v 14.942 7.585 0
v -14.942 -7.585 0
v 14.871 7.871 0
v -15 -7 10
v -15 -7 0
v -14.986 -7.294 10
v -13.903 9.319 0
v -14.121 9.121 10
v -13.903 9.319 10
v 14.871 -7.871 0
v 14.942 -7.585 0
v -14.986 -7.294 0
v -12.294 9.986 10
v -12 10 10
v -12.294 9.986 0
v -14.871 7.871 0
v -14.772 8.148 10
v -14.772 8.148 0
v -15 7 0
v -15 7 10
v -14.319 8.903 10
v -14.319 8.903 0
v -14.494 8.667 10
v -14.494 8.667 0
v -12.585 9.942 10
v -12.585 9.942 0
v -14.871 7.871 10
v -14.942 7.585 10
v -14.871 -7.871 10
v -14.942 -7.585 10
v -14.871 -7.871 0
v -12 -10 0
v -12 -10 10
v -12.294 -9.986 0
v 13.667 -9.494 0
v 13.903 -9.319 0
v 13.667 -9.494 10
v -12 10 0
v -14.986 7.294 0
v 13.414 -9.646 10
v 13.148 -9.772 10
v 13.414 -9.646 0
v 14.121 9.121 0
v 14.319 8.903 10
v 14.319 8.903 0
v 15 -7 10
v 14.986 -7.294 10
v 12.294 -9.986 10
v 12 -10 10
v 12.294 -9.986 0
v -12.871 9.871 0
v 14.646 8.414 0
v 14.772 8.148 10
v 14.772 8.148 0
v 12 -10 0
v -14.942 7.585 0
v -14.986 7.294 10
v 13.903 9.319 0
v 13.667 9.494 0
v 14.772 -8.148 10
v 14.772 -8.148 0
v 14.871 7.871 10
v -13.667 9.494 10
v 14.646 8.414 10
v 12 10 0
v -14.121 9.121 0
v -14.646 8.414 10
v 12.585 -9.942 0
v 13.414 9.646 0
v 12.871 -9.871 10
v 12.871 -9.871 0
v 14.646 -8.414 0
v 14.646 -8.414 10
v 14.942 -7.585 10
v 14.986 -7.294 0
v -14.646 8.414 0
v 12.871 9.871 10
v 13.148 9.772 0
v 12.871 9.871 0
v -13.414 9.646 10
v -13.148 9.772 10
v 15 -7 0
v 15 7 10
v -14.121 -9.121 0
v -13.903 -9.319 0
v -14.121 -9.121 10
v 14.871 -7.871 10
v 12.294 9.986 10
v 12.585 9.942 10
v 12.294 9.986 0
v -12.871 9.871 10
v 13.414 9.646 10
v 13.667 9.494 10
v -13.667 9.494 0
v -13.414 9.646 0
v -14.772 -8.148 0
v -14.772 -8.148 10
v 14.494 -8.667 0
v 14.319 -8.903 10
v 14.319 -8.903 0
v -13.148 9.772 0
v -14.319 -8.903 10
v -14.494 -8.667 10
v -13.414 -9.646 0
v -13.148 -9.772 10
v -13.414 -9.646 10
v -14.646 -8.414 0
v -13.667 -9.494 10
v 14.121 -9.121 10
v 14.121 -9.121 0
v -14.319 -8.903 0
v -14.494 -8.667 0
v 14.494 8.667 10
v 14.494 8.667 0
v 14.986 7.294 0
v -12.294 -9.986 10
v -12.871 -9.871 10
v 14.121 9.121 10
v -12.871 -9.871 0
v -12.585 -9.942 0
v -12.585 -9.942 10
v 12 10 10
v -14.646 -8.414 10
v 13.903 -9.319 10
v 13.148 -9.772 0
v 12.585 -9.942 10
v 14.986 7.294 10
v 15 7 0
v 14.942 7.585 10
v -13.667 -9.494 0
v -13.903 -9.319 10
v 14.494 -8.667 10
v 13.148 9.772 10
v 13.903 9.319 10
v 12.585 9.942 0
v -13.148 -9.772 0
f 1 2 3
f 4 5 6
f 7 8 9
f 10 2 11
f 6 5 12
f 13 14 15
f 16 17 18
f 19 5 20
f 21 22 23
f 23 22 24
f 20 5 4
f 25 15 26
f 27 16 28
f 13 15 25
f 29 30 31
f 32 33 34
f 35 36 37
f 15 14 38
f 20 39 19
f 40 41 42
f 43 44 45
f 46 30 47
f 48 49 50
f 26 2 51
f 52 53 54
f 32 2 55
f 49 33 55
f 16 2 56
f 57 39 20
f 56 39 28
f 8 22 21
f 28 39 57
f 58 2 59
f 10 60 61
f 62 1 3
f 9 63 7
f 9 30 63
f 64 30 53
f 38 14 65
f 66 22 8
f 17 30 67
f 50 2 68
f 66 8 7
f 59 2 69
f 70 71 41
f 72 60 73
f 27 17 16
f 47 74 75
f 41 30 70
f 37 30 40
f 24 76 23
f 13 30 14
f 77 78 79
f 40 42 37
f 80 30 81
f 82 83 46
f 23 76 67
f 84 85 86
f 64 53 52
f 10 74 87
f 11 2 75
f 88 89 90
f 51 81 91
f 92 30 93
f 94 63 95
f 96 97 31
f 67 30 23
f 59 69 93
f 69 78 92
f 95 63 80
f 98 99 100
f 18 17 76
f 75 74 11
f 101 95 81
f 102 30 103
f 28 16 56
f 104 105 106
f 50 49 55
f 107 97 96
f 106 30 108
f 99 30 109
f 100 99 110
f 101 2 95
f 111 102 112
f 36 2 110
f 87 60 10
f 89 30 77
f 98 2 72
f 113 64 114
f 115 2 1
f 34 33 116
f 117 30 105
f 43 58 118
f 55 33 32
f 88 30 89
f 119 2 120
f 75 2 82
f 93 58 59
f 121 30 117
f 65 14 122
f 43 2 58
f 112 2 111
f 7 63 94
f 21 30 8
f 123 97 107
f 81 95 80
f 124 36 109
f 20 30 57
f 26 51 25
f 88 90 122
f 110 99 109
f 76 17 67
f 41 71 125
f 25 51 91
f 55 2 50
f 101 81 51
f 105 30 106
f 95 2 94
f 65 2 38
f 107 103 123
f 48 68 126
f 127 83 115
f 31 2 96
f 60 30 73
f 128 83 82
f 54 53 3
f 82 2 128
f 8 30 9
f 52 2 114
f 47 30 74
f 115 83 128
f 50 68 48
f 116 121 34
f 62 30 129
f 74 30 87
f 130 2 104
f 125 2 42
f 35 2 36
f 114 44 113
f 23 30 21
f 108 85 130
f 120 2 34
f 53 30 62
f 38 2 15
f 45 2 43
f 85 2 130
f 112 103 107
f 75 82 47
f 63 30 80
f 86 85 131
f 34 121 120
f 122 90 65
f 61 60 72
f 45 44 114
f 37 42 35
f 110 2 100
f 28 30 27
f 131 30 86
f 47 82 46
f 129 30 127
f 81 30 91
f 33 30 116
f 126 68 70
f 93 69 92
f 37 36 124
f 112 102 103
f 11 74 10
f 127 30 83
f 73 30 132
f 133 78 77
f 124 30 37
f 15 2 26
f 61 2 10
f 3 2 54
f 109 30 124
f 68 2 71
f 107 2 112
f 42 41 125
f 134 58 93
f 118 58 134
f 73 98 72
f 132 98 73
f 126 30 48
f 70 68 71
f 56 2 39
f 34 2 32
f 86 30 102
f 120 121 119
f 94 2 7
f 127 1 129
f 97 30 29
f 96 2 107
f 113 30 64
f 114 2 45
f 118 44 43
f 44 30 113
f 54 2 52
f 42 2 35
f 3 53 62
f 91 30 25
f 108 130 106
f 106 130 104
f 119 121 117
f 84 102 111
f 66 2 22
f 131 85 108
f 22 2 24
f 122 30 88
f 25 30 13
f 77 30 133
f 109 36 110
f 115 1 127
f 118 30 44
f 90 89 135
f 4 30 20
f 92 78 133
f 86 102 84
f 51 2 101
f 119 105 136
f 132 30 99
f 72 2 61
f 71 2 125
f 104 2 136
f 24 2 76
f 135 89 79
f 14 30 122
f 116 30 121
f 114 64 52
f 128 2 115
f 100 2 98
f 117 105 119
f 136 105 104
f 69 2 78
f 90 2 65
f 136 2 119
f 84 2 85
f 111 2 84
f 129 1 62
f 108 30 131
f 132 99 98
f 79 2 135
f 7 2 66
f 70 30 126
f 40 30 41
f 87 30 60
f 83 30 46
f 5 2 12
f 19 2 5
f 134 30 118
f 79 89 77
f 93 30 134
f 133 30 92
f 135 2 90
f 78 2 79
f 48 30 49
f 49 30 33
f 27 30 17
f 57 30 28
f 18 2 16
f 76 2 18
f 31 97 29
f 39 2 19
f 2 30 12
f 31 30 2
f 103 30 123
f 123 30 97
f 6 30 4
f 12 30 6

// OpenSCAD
/**
 * rounded_box.scad
 *
 * Create a rounded box with rounded corners.
 *
 * @param size [x, y, z] - The size of the box.
 * @param radius - The radius of the corners.
 * @param center - Center the box at the origin.
 * @param fn - The number of facets to use for the cylinder.
 *
 * @return {object} - A rounded box with rounded corners.
 */
module rounded_box(size = [10, 10, 10], radius = 2, center = false, fn = 64) {
    hull() {
        for (x = [-1, 1], y = [-1, 1]) {
            translate([x * (size[0] / 2 - radius), y * (size[1] / 2 - radius), 0])
                cylinder(h=size[2], r=radius, center=center, $fn=fn);
        }
    }
}

// Example Usage
rounded_box([30, 20, 10], radius=3);
